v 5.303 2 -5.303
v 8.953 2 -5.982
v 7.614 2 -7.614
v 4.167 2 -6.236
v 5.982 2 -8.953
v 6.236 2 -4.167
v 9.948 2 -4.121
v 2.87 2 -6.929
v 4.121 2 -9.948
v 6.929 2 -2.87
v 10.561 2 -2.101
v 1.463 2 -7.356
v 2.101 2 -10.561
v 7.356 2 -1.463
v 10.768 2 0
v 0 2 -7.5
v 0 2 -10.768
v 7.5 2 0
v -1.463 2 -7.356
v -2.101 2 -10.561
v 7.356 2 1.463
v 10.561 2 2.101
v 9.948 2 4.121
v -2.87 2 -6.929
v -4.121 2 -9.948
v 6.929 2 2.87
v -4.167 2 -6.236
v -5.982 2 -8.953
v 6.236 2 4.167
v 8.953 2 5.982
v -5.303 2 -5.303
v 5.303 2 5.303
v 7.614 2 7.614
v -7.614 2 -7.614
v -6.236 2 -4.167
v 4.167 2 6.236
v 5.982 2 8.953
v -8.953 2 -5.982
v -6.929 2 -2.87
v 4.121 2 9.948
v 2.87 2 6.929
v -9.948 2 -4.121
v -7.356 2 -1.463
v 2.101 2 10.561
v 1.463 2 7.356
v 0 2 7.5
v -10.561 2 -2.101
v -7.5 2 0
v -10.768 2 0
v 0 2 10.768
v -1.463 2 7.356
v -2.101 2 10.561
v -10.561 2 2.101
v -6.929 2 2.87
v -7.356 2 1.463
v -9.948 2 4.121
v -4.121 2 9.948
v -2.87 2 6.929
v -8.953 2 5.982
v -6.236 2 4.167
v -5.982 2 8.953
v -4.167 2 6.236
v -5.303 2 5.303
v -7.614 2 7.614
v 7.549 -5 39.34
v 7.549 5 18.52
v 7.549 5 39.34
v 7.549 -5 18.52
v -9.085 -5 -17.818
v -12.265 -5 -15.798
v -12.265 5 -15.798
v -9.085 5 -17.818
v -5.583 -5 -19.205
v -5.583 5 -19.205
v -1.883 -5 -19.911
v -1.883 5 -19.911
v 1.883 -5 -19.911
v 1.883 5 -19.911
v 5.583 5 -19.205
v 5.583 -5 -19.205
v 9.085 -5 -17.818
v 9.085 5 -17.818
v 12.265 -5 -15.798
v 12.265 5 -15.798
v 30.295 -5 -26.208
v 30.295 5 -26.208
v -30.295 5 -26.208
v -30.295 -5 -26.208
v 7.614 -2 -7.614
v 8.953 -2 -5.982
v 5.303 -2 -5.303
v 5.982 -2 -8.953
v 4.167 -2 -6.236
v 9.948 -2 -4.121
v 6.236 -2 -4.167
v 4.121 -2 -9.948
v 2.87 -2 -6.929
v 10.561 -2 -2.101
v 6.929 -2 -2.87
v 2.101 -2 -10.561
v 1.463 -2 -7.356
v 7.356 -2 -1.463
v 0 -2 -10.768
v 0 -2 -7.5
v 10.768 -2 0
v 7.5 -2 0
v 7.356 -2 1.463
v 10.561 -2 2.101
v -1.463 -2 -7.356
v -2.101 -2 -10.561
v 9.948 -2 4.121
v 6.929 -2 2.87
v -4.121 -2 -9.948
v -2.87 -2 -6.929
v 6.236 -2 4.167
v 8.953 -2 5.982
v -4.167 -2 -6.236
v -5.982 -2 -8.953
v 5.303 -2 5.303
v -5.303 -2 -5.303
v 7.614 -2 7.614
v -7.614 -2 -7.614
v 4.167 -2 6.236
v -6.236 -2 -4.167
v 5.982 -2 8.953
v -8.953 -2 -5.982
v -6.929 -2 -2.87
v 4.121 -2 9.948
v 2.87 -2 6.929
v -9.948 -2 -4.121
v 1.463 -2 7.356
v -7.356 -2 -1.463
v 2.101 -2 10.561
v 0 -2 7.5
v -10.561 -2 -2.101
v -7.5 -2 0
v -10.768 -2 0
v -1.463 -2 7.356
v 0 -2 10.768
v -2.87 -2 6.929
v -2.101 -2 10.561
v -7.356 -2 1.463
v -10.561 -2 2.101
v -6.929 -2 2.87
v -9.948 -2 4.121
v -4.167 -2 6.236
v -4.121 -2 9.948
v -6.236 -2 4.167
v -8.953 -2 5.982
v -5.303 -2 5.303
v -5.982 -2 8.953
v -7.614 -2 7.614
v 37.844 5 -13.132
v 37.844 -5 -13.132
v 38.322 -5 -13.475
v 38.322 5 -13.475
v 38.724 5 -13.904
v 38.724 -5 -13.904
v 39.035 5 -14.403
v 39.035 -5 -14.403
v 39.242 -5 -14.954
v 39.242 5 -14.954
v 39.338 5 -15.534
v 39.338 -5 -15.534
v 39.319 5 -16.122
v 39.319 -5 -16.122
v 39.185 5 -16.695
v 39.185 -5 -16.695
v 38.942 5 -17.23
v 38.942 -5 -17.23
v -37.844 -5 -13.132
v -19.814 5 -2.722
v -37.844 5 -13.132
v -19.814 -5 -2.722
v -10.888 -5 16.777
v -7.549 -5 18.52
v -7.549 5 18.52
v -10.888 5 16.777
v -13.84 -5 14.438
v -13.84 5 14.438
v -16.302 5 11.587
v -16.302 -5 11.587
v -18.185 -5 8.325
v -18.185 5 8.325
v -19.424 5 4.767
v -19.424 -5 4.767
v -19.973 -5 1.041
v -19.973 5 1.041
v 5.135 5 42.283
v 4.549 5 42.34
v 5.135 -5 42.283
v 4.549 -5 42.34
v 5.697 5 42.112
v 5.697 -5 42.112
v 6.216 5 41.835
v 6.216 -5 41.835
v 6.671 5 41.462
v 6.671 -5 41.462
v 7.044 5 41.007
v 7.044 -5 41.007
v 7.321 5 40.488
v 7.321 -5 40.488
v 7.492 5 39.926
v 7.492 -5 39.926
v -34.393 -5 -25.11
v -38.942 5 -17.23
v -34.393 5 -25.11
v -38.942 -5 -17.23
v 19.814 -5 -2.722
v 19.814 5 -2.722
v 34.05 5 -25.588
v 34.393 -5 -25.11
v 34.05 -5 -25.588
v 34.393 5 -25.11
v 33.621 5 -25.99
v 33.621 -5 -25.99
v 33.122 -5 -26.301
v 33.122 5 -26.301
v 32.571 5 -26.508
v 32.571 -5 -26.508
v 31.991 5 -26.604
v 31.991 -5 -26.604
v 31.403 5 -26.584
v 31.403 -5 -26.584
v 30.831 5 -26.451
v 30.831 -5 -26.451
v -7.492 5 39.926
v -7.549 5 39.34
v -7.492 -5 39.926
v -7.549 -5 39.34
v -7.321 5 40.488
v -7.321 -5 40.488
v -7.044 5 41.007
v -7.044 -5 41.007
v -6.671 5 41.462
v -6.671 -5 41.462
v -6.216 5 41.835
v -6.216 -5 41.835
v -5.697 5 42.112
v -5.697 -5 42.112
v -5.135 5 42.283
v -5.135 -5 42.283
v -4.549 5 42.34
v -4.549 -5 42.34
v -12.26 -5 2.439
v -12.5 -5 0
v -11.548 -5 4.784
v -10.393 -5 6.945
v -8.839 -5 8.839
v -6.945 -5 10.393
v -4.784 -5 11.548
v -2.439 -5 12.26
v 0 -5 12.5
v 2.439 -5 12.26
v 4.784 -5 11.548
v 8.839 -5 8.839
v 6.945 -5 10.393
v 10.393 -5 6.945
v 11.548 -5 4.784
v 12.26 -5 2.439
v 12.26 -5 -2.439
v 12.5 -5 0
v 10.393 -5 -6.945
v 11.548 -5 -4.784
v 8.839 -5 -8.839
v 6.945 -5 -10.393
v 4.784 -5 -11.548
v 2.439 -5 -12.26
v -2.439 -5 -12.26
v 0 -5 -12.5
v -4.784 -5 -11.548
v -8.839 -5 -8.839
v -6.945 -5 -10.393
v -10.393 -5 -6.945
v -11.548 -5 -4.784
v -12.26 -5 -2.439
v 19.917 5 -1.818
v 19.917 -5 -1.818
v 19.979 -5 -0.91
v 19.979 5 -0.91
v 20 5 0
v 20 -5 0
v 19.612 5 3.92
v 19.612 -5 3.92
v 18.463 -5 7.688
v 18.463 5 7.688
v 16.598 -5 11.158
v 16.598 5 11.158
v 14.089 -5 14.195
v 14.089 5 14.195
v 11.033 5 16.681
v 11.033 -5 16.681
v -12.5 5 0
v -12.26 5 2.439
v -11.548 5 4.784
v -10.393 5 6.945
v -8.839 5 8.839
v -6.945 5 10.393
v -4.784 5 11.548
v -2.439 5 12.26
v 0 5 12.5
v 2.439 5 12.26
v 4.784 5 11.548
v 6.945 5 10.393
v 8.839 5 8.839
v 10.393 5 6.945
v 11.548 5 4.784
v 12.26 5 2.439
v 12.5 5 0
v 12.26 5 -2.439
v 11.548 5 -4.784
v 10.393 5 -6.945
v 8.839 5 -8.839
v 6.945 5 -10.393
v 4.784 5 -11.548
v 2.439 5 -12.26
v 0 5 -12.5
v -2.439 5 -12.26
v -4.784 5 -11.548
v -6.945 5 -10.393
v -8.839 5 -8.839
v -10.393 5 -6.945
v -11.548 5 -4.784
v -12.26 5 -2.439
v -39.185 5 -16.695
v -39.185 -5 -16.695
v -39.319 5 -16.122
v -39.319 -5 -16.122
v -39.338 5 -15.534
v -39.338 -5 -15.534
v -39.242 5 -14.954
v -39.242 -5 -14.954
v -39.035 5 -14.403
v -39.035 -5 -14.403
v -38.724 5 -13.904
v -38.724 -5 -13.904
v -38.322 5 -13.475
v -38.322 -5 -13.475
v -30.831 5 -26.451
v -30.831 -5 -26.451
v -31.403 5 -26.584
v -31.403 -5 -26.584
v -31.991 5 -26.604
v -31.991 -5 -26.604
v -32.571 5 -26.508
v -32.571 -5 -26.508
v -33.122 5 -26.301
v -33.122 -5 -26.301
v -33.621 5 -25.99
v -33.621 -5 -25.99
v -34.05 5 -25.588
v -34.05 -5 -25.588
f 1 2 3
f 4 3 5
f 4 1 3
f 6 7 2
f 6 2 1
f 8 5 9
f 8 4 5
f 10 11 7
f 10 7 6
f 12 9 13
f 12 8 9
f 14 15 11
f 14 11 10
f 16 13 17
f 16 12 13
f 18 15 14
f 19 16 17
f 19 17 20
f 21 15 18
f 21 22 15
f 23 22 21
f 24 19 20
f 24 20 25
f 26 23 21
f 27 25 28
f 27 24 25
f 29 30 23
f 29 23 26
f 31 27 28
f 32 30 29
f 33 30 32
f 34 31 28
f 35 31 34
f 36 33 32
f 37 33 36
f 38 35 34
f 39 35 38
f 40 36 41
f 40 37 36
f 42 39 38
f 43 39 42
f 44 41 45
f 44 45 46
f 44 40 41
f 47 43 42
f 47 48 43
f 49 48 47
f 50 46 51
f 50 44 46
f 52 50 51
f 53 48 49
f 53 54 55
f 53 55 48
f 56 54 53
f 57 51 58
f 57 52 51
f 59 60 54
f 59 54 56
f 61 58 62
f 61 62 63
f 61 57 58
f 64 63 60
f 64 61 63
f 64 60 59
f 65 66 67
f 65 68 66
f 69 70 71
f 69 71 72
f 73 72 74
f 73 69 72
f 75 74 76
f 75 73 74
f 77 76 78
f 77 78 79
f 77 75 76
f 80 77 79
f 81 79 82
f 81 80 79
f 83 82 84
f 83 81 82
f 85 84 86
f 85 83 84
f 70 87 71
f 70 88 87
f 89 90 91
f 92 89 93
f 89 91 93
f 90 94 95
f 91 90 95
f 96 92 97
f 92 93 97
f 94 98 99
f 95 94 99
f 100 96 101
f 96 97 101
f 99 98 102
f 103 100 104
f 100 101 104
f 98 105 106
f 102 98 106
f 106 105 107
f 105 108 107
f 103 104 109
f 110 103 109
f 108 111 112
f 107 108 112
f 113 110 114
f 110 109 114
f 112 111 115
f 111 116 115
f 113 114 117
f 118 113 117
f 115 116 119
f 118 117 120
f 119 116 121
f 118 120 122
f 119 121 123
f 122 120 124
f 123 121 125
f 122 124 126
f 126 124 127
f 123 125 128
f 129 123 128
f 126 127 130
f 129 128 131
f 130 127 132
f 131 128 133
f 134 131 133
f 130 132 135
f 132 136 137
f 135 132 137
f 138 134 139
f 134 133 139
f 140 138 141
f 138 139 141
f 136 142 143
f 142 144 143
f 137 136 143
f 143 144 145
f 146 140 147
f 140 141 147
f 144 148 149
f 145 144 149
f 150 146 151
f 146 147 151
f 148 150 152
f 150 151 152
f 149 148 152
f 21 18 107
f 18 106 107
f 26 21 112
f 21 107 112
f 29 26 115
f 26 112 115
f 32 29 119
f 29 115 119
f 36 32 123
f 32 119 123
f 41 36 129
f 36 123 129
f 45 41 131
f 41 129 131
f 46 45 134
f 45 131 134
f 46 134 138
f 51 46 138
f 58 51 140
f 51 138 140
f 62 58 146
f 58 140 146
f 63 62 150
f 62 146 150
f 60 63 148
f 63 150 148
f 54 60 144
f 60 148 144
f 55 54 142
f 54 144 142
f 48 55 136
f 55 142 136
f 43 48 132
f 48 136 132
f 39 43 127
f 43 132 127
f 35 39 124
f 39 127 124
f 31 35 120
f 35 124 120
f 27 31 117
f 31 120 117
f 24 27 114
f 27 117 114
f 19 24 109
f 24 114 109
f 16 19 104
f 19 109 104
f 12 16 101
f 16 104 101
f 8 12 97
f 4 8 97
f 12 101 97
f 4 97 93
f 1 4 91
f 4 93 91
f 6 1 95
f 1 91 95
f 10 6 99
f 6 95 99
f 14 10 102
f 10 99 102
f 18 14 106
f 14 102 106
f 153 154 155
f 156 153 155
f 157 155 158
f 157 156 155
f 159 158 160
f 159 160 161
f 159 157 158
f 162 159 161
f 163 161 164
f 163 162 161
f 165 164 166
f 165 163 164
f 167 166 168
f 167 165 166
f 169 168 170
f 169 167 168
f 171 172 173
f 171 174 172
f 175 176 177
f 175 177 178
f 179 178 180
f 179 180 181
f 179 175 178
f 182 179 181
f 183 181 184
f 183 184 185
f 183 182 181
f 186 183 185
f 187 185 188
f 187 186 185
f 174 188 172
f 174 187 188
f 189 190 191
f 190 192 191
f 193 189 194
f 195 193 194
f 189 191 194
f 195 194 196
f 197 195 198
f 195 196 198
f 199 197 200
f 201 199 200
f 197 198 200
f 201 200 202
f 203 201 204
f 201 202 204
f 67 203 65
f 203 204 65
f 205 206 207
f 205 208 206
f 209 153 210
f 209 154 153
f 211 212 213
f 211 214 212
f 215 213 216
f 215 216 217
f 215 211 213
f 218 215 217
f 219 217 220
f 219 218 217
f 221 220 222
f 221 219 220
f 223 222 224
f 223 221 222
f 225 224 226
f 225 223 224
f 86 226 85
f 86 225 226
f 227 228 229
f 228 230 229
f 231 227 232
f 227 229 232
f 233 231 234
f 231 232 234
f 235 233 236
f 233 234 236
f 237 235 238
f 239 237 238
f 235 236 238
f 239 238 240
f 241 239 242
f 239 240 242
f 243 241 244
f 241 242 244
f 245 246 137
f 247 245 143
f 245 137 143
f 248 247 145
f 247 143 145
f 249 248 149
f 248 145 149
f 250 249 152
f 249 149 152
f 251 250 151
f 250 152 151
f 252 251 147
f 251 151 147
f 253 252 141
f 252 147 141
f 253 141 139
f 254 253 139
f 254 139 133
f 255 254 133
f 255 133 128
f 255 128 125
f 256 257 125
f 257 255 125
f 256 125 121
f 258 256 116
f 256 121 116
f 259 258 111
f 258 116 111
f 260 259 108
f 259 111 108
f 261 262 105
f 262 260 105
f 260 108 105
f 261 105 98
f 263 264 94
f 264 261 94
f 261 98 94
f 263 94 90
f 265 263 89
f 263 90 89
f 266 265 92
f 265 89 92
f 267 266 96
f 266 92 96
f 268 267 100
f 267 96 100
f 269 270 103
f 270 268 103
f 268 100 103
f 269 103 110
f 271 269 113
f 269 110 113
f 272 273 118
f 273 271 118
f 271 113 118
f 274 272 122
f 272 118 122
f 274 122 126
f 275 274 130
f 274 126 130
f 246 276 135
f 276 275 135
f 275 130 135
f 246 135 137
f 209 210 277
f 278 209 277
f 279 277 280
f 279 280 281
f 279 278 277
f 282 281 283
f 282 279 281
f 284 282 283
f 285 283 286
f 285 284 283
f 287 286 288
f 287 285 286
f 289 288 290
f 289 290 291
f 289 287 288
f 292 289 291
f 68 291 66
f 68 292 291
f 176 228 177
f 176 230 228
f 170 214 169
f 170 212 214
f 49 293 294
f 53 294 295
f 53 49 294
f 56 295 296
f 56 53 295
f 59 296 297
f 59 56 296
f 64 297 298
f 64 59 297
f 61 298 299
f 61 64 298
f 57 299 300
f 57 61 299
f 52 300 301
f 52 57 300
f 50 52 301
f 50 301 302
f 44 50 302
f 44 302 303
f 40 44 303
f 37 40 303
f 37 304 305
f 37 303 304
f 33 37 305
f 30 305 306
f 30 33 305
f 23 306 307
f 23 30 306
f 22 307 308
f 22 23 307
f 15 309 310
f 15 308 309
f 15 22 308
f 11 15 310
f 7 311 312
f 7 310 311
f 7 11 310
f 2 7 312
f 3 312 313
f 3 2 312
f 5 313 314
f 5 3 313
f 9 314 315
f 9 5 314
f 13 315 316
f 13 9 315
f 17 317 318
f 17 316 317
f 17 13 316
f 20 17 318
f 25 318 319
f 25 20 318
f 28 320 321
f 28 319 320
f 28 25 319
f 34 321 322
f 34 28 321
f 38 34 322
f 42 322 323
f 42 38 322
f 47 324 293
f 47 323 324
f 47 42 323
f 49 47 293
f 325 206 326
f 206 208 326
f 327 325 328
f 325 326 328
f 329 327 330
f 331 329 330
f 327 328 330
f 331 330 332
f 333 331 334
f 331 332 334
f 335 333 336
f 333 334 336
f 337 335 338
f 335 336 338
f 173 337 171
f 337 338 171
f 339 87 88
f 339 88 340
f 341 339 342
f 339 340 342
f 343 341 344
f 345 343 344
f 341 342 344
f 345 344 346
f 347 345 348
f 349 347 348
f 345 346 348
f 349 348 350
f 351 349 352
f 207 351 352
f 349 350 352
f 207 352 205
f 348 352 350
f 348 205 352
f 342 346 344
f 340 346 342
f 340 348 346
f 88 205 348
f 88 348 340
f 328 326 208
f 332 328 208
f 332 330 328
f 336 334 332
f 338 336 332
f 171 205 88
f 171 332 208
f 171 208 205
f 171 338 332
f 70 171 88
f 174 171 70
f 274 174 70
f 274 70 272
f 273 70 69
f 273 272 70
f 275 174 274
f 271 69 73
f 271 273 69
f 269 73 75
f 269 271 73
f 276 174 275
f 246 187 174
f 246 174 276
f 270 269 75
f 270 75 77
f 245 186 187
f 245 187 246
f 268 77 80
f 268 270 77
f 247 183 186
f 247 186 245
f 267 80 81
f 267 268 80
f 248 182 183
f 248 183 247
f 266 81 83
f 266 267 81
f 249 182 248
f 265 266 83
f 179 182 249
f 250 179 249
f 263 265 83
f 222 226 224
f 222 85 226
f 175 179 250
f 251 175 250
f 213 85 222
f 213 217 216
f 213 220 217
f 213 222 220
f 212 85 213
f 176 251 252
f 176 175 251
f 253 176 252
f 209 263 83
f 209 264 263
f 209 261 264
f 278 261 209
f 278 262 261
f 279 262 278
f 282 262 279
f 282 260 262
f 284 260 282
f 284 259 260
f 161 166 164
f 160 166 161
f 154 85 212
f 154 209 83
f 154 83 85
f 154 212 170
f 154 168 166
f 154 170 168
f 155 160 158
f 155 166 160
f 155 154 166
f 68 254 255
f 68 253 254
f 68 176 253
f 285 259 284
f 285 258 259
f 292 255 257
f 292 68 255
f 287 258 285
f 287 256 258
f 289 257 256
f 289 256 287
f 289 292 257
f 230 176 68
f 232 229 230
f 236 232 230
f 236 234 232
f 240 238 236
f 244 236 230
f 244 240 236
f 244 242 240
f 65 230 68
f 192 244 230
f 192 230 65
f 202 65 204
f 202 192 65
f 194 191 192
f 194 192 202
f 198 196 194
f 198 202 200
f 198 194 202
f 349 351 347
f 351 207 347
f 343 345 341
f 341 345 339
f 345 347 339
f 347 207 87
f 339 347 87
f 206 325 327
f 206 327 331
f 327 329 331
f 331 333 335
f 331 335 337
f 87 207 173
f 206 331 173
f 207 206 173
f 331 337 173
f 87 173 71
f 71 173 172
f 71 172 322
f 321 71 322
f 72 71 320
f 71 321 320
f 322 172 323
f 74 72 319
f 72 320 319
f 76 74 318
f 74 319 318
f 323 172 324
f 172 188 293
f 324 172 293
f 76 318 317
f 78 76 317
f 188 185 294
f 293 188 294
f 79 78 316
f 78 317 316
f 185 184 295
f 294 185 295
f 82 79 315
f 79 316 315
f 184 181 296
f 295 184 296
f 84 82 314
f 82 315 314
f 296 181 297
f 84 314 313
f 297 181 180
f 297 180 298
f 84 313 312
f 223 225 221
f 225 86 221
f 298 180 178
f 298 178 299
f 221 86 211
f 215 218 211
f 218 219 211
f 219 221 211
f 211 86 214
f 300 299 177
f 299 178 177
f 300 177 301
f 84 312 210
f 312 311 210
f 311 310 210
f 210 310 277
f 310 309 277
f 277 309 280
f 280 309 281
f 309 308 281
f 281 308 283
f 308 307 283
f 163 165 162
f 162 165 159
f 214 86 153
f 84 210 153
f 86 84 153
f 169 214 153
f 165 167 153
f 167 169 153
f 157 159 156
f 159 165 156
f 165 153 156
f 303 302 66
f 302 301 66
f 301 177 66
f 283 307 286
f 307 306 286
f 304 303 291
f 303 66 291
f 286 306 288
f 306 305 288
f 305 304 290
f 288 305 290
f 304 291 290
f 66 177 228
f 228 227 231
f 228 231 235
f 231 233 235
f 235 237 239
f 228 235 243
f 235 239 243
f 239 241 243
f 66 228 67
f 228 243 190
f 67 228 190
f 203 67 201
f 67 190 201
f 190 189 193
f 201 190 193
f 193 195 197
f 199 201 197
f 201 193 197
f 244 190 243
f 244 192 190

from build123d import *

# Parameters (mm, degrees)
F1_DEPTH = 5
F2_R     = 12.5
F3_DEPTH = 3
F3_TAPER = 30
F4_R     = 7.5
F5_DEPTH = 5.0010001
F6_DEPTH = 5.0010001
F7_R     = 3


# Not quite as in the source:
# - a pattern or mirror of a feature is missing from the dataset's text; its kind, count and spacing are read off the source's solid


with BuildPart() as f1:
    # F0 (on Front) → F1 (new body, symmetric)
    with BuildSketch(Plane.XZ):
        with BuildLine():
            ThreePointArc((19.8138622769, -2.7222897845), (19.9534113066, -1.3643229935), (20, 0))
            ThreePointArc((20, 0), (16.5979995869, 11.1582440246), (7.5493590287, 18.5204529711))
            Line((7.5493590287, 18.5204529711), (-7.5493590287, 18.5204529711))
            ThreePointArc((-7.5493590287, 18.5204529711), (-17.3205080757, 10), (-19.8138622769, -2.7222897845))
            Line((-19.8138622769, -2.7222897845), (-12.2645032483, -15.7981631867))
            ThreePointArc((-12.2645032483, -15.7981631867), (0, -20), (12.2645032483, -15.7981631867))
            Line((12.2645032483, -15.7981631867), (19.8138622769, -2.7222897845))
        make_face()
        with BuildLine():
            Line((-7.5493590287, 18.5204529711), (7.5493590287, 18.5204529711))
            ThreePointArc((7.5493590287, 18.5204529711), (0, 20), (-7.5493590287, 18.5204529711))
        make_face()
        with BuildLine():
            ThreePointArc((-7.5493590287, 18.5204529711), (0, 20), (7.5493590287, 18.5204529711))
            Line((7.5493590287, 18.5204529711), (7.5493590287, 42.3402367583))
            Line((7.5493590287, 42.3402367583), (-7.5493590287, 42.3402367583))
            Line((-7.5493590287, 42.3402367583), (-7.5493590287, 18.5204529711))
        make_face()
        with BuildLine():
            Line((40.4424001493, -14.632181678), (19.8138622769, -2.7222897845))
            ThreePointArc((19.8138622769, -2.7222897845), (17.3205080757, -10), (12.2645032483, -15.7981631867))
            Line((12.2645032483, -15.7981631867), (32.8930411206, -27.7080550803))
            Line((32.8930411206, -27.7080550803), (40.4424001493, -14.632181678))
        make_face()
        with BuildLine():
            ThreePointArc((12.2645032483, -15.7981631867), (17.3205080757, -10), (19.8138622769, -2.7222897845))
            Line((19.8138622769, -2.7222897845), (12.2645032483, -15.7981631867))
        make_face()
        with BuildLine():
            Line((-12.2645032483, -15.7981631867), (-19.8138622769, -2.7222897845))
            ThreePointArc((-19.8138622769, -2.7222897845), (-17.3205080757, -10), (-12.2645032483, -15.7981631867))
        make_face()
        with BuildLine():
            ThreePointArc((-12.2645032483, -15.7981631867), (-17.3205080757, -10), (-19.8138622769, -2.7222897845))
            Line((-19.8138622769, -2.7222897845), (-40.4424001493, -14.632181678))
            Line((-40.4424001493, -14.632181678), (-32.8930411206, -27.7080550803))
            Line((-32.8930411206, -27.7080550803), (-12.2645032483, -15.7981631867))
        make_face()
    extrude(amount=F1_DEPTH, both=True)

    # F2 (on face) → F3 (cut)
    with BuildSketch(Plane(origin=(0, 5, 0), x_dir=(-1, 0, 0), z_dir=(0, 1, 0))):
        Circle(F2_R)
    f3 = extrude(amount=-F3_DEPTH, taper=F3_TAPER, mode=Mode.SUBTRACT)

    # F3_copies: F3 across plane
    add(f3.mirror(Plane(origin=(0, 0, 0), x_dir=(0, 0, -1), z_dir=(0, -1, 0))), mode=Mode.SUBTRACT)

    # F4 (on Front) → F5 (cut, through all)
    with BuildSketch(Plane.XZ):
        Circle(F4_R)
    extrude(amount=-F5_DEPTH, mode=Mode.SUBTRACT)

    # F6 (cut, through all): a face of the model
    f6_faces = [f1.faces().sort_by_distance(p)[0] for p in [
        (0, 0, 0),
    ]]
    extrude(f6_faces, amount=-F6_DEPTH, mode=Mode.SUBTRACT)

    # F7
    f7_edges = [f1.edges().sort_by_distance(p)[0] for p in [
        (-7.549359, 0, 42.340237),
        (7.549359, 0, 42.340237),
        (40.4424, 0, -14.632182),
        (32.893041, 0, -27.708055),
        (-32.893041, 0, -27.708055),
        (-40.4424, 0, -14.632182),
    ]]
    fillet(f7_edges, radius=F7_R)


solid = f1.part
